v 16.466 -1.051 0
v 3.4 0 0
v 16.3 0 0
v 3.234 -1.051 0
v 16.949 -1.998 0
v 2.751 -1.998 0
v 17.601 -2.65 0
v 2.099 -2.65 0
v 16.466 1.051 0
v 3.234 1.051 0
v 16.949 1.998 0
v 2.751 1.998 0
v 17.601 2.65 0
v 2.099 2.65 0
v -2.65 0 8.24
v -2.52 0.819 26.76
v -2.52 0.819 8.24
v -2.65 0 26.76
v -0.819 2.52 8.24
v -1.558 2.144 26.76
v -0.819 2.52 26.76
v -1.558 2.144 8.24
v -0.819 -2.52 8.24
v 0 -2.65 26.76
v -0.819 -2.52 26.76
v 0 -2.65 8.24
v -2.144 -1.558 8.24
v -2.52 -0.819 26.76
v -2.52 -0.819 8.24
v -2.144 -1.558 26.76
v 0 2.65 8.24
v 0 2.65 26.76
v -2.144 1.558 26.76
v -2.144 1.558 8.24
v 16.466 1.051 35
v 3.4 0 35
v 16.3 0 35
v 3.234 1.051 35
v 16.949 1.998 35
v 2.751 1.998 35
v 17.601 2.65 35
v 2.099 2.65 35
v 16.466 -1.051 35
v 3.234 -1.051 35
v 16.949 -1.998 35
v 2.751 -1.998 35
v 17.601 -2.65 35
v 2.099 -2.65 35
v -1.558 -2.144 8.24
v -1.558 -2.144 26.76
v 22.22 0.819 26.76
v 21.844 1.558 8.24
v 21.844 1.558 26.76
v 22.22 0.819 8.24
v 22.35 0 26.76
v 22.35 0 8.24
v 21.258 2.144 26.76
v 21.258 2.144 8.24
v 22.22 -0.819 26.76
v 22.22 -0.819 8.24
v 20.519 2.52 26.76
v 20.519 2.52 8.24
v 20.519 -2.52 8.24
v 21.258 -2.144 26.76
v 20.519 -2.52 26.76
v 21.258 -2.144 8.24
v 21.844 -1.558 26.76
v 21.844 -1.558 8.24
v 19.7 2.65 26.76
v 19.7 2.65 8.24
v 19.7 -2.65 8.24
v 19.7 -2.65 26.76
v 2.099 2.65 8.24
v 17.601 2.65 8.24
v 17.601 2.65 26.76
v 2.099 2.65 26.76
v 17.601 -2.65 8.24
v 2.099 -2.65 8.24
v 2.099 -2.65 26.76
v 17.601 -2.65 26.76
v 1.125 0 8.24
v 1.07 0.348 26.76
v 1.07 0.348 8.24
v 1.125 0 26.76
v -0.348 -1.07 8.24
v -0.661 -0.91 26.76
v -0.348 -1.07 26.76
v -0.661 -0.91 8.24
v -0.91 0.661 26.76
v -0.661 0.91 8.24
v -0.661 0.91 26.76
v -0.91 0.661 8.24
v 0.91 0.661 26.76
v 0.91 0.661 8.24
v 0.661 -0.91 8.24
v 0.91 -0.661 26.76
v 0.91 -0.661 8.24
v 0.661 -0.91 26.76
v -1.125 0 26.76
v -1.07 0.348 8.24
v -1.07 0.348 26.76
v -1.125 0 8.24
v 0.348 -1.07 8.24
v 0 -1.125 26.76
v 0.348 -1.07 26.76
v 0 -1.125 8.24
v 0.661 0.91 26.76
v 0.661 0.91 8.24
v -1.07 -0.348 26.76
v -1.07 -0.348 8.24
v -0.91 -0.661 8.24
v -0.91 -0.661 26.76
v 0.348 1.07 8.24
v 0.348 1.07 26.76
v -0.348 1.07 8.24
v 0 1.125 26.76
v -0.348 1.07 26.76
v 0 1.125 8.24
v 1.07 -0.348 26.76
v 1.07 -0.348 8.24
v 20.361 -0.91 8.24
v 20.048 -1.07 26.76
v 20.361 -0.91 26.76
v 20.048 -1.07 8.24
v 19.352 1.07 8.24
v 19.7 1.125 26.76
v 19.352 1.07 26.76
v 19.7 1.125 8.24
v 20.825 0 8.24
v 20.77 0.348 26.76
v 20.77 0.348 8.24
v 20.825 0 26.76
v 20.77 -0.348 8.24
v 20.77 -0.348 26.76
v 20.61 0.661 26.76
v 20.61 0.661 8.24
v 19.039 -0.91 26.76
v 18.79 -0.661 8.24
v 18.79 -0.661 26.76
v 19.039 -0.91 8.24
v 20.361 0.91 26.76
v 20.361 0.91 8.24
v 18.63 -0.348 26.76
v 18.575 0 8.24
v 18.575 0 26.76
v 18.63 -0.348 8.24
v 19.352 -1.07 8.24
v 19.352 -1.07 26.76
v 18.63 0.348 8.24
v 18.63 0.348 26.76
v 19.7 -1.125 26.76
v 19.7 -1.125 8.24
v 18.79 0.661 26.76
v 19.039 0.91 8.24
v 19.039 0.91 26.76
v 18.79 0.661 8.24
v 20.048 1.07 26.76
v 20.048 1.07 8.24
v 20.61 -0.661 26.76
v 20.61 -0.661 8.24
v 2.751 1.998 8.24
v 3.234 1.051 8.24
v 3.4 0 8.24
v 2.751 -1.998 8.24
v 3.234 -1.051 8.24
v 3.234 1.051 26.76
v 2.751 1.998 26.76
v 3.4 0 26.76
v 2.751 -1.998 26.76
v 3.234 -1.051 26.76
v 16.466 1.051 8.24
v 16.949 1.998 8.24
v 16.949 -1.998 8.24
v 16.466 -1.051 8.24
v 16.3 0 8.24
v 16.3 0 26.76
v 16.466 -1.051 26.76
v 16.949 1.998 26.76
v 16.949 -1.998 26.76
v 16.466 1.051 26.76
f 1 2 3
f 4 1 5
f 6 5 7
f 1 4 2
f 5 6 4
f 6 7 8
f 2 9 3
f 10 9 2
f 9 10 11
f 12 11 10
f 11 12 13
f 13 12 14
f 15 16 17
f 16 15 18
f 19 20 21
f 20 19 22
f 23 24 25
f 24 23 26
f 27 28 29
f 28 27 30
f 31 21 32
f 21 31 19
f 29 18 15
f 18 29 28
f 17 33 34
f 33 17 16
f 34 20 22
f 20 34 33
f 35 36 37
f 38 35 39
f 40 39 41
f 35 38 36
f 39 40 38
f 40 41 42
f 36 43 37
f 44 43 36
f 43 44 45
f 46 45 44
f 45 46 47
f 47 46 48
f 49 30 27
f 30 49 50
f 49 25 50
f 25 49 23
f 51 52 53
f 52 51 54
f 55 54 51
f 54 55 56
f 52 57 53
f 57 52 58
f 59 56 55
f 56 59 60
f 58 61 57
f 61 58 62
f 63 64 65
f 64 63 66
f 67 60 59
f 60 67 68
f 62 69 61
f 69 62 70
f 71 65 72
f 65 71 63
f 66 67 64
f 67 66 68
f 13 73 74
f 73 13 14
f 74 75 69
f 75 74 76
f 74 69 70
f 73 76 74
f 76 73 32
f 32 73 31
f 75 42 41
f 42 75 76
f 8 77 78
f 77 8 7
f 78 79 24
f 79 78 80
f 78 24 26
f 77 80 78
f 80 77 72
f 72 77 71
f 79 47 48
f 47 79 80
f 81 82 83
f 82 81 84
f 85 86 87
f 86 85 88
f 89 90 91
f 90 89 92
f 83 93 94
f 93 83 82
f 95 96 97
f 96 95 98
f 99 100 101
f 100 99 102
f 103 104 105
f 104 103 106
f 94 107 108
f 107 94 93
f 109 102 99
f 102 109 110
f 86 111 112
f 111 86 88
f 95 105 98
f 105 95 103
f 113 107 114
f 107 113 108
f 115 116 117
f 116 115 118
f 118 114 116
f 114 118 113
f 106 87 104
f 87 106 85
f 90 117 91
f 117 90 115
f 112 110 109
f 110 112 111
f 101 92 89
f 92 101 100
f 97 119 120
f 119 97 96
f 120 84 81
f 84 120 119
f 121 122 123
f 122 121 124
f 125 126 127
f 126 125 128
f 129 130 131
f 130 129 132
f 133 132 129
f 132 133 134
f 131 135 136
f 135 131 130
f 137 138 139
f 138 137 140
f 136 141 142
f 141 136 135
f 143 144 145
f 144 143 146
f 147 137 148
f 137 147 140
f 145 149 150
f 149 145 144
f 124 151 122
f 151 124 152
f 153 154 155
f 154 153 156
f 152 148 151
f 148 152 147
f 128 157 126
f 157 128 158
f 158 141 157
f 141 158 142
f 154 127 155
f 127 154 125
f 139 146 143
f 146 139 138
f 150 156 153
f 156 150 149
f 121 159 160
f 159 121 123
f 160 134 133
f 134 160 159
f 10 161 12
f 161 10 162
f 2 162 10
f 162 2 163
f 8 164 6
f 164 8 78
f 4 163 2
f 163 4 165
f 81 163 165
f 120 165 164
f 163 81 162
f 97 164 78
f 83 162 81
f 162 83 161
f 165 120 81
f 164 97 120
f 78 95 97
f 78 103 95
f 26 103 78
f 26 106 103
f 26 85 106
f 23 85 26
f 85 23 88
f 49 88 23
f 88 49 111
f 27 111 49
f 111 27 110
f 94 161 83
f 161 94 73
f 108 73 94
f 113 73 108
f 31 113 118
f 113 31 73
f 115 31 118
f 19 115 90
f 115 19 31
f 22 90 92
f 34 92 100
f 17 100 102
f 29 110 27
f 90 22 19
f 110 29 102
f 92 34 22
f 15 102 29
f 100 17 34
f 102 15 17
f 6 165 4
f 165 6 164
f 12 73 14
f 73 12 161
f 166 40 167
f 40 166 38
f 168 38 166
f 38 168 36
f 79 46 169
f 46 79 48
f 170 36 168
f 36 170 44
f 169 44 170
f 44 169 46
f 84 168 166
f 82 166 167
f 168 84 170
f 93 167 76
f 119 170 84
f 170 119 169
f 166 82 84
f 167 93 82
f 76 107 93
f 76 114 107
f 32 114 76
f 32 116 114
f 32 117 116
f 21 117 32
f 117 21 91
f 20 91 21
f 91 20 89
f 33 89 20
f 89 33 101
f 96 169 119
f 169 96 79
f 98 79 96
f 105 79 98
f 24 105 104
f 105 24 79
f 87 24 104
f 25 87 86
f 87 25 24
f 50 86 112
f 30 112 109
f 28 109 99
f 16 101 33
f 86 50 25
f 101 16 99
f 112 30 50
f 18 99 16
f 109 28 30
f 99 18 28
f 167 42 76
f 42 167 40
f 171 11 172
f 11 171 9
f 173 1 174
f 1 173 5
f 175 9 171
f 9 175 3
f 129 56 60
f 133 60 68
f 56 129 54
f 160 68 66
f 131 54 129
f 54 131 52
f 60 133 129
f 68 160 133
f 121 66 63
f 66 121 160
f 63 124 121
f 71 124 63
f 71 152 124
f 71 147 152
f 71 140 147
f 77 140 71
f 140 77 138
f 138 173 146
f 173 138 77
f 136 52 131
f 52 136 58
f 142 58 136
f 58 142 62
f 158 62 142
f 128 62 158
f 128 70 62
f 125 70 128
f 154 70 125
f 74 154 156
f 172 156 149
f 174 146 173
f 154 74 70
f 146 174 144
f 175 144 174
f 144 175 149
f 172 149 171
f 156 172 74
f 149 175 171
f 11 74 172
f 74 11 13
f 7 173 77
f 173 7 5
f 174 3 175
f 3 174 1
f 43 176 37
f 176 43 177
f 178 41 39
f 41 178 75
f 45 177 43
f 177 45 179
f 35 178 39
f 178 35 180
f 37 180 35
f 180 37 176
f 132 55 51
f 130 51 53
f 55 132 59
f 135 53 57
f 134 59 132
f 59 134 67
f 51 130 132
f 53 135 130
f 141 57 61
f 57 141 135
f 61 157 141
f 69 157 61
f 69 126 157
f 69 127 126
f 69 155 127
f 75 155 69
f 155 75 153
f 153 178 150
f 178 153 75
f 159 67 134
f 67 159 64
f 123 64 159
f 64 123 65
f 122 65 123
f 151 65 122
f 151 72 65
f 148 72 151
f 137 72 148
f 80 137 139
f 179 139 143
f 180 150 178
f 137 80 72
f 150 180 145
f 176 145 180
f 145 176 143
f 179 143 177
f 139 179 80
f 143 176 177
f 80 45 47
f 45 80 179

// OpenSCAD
// file: belt_configuration.scad
belt_thickness = 5.3;
belt_height = 35;

buckle_thickness = 2;
buckle_length = 30;


cross_width = 25;
h_width = 25;
peak_width = 10;

link_height = 20;

pin_diameter = 2.05;

pin_tolerance = 0.2;

hole_diameter = 3;

link_tolerance = 1.5;
link_depth = pin_diameter + 2*link_tolerance;
link_depth_height = 20;


$fn = 20;
mo = 0.01;
// main file
include <belt_configuration.scad>


module cross()
{
  cut_height = belt_height - link_depth_height + link_tolerance;

  difference()
  {
    // main part
    union()
    {
      cylinder(r=belt_thickness / 2, h=belt_height);

      translate([cross_width - belt_thickness,0,0])
        cylinder(r=belt_thickness / 2, h=belt_height);

      translate([0, -belt_thickness / 2, 0])
        cube([cross_width-belt_thickness, belt_thickness, belt_height]);
    }

    // left pin
    translate([0,0,-mo])
      cylinder(r=(pin_diameter +pin_tolerance)/ 2 , h=belt_height + 2 * mo);

    // right pin
    translate([cross_width - belt_thickness,0,-mo])
      cylinder(r=(pin_diameter +pin_tolerance) / 2, h=belt_height + 2 * mo);

    // bottom left cut
    translate([0,0,-mo])
      cylinder(r=(belt_thickness+link_tolerance) / 2, h=(cut_height) / 2);

    // top left cut
    translate([0,0,belt_height - (cut_height) / 2+mo])
      cylinder(r=(belt_thickness+link_tolerance) / 2, h=(cut_height) / 2);

    // bottom right cut
    translate([cross_width - belt_thickness,0,-mo])
      cylinder(r=(belt_thickness+link_tolerance) / 2, h=(cut_height) / 2);

    // top right cut
    translate([cross_width - belt_thickness,0,belt_height - (cut_height) / 2+mo])
      cylinder(r=(belt_thickness+link_tolerance) / 2, h=(cut_height) / 2);
  }
}

cross();
